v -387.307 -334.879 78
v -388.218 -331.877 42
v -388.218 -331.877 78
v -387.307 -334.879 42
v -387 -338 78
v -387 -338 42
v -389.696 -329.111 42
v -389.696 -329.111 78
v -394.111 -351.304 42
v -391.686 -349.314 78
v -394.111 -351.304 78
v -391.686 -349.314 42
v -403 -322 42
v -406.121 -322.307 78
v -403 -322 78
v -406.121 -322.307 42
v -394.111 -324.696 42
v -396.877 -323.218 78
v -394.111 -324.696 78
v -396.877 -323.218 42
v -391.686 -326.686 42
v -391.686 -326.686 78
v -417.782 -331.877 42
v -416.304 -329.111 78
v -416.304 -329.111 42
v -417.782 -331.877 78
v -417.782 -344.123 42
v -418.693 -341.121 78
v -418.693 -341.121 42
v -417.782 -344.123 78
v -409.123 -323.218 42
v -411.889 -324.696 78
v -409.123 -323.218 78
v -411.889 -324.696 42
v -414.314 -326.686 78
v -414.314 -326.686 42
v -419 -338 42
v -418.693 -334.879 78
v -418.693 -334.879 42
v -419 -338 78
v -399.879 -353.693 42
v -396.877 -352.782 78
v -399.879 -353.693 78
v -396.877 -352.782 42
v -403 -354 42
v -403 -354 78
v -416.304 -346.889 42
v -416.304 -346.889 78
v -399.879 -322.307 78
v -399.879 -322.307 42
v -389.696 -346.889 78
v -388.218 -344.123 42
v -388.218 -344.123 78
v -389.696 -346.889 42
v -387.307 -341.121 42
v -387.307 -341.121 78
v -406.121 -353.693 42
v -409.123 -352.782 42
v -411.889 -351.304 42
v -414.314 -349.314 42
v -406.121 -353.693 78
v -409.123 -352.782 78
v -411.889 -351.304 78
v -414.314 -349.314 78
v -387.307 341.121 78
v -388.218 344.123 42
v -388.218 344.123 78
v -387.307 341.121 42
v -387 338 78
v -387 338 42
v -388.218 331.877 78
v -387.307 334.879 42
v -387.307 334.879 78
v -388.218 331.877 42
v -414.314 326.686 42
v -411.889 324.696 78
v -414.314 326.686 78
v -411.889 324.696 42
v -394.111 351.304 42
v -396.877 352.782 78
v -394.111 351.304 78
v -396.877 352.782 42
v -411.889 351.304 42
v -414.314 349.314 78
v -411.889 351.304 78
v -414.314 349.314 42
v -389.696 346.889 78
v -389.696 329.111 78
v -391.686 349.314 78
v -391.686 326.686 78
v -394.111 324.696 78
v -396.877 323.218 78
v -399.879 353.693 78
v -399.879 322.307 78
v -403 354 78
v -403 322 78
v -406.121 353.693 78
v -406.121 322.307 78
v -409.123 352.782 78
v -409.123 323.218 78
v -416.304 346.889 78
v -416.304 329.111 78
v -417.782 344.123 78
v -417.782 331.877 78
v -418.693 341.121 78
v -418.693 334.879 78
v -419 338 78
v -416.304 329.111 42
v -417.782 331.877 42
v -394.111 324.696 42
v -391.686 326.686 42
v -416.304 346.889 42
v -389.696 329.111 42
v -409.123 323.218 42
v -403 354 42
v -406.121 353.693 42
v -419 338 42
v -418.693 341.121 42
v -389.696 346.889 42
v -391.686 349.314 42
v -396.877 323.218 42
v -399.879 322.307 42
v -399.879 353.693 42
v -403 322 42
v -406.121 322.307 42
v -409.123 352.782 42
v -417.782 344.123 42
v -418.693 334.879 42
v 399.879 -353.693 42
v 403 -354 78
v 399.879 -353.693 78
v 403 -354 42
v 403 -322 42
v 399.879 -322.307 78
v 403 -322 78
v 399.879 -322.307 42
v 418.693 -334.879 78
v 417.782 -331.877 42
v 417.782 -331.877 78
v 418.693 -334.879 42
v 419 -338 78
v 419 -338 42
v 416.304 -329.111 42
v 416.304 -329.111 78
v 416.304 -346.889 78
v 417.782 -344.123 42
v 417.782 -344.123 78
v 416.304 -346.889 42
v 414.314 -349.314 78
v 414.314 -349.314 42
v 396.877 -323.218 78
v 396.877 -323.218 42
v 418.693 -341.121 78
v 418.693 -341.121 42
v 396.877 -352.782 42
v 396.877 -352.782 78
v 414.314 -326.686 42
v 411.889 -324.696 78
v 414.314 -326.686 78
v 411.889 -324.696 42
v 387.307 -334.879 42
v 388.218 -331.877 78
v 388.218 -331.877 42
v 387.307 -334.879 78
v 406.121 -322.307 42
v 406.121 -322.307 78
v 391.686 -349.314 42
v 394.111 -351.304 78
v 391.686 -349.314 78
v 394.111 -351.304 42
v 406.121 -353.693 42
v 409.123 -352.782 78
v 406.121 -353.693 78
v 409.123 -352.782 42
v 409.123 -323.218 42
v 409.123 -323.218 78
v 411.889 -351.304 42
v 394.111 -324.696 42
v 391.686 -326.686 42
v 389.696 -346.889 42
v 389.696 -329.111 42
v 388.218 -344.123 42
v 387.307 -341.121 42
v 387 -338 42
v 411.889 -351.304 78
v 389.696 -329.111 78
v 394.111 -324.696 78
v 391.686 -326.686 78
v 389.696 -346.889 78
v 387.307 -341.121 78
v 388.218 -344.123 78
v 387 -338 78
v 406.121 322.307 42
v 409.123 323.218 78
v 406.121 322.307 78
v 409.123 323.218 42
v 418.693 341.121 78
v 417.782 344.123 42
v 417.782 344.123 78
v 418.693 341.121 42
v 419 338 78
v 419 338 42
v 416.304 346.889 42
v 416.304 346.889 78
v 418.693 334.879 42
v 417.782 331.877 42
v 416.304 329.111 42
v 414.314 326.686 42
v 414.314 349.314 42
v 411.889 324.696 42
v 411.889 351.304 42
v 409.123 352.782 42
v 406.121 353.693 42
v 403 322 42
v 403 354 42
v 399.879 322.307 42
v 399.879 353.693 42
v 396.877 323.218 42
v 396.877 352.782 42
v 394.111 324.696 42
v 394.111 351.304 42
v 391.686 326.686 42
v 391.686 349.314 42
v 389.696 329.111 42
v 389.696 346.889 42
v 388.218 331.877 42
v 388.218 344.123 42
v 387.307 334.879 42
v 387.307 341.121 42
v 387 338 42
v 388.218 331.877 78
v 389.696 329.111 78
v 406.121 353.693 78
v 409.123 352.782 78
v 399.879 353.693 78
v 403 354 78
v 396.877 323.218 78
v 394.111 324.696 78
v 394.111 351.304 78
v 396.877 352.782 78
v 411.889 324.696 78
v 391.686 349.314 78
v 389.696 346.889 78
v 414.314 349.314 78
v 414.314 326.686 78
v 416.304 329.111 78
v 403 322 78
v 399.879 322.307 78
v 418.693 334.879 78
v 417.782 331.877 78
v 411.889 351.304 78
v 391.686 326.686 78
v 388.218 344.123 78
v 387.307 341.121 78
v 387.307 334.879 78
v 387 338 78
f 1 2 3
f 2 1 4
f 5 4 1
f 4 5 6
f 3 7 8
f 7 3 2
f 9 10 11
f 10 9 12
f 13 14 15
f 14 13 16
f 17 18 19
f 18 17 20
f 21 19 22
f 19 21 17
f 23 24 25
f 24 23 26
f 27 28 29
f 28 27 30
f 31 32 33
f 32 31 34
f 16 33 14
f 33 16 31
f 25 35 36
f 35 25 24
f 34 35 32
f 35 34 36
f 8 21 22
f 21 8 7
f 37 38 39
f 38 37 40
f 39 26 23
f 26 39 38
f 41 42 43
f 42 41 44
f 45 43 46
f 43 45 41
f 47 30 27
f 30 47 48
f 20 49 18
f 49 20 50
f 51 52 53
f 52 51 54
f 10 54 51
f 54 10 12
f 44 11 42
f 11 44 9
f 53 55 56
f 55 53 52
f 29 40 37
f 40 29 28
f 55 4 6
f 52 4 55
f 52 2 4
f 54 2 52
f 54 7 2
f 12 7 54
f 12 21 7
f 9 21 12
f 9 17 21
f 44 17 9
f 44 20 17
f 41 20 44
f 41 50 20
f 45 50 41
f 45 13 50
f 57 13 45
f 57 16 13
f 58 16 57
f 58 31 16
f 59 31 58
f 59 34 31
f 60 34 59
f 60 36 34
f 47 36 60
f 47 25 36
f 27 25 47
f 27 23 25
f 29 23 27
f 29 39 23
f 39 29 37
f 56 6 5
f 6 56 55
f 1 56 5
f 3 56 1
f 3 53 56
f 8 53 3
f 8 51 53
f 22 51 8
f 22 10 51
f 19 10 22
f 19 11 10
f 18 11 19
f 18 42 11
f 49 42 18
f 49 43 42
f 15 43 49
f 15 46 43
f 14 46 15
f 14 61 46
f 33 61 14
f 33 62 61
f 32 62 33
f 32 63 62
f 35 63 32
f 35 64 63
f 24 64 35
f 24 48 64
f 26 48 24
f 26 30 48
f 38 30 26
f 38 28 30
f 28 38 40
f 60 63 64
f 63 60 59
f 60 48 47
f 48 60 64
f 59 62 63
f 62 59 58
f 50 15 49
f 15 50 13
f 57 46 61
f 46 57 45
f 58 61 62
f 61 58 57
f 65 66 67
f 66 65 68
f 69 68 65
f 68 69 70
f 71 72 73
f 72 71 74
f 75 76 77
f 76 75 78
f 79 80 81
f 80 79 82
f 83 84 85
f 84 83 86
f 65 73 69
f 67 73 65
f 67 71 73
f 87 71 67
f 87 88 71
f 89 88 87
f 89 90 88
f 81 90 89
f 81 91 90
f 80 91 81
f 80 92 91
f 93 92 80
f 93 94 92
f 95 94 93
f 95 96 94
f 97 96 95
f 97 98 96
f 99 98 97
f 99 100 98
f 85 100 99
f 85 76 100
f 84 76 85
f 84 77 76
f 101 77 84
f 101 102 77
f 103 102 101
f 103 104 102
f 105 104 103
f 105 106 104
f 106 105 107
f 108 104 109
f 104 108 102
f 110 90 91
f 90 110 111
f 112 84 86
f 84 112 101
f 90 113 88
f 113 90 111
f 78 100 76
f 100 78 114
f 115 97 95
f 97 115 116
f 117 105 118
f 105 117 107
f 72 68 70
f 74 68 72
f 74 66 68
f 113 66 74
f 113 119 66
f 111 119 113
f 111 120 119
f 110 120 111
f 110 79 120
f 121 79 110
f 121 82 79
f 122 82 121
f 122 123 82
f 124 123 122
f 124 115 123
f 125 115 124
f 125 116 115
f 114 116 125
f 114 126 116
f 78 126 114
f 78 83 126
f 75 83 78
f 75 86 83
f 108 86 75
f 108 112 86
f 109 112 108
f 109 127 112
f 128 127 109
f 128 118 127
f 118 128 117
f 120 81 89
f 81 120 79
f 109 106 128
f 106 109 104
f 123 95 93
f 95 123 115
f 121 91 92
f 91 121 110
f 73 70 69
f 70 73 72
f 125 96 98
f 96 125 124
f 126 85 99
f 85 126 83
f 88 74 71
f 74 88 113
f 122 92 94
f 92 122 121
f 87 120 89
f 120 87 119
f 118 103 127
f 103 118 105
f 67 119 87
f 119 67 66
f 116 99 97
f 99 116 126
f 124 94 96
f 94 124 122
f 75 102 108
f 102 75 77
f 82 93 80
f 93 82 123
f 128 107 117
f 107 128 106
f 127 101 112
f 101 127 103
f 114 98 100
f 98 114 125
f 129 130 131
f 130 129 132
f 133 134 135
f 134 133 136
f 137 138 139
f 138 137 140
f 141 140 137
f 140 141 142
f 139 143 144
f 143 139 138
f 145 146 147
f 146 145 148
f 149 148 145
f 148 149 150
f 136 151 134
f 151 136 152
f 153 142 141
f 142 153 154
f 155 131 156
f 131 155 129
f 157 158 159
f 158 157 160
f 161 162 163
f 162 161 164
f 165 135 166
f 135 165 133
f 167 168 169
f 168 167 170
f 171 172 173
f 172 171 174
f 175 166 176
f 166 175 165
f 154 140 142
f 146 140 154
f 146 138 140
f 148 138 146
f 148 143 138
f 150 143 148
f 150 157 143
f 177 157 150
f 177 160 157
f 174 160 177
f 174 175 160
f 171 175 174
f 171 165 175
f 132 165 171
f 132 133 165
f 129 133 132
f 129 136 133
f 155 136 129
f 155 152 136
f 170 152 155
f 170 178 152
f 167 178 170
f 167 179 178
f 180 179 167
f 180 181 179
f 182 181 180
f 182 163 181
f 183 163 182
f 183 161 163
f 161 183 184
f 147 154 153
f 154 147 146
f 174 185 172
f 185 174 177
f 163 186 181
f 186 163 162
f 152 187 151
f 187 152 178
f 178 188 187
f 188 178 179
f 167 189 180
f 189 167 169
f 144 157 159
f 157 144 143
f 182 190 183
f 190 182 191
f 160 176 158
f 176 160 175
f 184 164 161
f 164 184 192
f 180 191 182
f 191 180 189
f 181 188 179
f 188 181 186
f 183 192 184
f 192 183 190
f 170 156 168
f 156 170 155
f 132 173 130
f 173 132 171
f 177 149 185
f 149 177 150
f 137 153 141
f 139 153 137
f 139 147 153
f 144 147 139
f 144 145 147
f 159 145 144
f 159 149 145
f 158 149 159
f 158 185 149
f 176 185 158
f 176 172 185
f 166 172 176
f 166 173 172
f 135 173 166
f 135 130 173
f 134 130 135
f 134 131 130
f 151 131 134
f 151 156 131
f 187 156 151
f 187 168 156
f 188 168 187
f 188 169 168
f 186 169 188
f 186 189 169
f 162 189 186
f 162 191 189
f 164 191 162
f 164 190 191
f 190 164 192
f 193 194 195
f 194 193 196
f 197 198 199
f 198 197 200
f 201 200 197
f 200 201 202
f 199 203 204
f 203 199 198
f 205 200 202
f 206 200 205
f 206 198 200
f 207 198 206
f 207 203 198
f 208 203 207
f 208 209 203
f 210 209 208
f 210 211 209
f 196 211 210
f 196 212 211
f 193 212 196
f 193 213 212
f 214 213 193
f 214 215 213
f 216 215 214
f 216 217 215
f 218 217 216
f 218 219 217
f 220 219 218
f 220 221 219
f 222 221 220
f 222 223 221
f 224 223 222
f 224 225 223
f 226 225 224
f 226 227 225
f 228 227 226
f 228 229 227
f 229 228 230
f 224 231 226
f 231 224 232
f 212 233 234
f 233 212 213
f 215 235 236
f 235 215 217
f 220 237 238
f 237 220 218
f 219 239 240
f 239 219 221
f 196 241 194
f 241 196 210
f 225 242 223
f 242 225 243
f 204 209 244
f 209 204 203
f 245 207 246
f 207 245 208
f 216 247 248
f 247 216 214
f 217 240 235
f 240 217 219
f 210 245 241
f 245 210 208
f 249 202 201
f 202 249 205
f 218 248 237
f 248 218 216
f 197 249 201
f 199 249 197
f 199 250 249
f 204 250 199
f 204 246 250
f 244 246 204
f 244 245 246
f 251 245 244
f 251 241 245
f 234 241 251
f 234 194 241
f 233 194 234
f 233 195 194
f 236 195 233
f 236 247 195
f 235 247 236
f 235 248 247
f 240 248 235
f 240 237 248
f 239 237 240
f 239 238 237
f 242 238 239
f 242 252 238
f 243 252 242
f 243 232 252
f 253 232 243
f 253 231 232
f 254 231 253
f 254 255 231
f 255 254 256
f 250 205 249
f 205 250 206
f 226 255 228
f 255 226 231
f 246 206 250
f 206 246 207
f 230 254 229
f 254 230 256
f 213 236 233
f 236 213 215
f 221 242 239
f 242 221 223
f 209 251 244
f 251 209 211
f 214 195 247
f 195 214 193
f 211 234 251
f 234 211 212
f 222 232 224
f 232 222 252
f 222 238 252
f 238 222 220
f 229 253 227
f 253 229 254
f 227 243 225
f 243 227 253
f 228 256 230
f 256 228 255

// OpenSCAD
export_only = true;
include <main.scad>
body_bumper_hazards();
